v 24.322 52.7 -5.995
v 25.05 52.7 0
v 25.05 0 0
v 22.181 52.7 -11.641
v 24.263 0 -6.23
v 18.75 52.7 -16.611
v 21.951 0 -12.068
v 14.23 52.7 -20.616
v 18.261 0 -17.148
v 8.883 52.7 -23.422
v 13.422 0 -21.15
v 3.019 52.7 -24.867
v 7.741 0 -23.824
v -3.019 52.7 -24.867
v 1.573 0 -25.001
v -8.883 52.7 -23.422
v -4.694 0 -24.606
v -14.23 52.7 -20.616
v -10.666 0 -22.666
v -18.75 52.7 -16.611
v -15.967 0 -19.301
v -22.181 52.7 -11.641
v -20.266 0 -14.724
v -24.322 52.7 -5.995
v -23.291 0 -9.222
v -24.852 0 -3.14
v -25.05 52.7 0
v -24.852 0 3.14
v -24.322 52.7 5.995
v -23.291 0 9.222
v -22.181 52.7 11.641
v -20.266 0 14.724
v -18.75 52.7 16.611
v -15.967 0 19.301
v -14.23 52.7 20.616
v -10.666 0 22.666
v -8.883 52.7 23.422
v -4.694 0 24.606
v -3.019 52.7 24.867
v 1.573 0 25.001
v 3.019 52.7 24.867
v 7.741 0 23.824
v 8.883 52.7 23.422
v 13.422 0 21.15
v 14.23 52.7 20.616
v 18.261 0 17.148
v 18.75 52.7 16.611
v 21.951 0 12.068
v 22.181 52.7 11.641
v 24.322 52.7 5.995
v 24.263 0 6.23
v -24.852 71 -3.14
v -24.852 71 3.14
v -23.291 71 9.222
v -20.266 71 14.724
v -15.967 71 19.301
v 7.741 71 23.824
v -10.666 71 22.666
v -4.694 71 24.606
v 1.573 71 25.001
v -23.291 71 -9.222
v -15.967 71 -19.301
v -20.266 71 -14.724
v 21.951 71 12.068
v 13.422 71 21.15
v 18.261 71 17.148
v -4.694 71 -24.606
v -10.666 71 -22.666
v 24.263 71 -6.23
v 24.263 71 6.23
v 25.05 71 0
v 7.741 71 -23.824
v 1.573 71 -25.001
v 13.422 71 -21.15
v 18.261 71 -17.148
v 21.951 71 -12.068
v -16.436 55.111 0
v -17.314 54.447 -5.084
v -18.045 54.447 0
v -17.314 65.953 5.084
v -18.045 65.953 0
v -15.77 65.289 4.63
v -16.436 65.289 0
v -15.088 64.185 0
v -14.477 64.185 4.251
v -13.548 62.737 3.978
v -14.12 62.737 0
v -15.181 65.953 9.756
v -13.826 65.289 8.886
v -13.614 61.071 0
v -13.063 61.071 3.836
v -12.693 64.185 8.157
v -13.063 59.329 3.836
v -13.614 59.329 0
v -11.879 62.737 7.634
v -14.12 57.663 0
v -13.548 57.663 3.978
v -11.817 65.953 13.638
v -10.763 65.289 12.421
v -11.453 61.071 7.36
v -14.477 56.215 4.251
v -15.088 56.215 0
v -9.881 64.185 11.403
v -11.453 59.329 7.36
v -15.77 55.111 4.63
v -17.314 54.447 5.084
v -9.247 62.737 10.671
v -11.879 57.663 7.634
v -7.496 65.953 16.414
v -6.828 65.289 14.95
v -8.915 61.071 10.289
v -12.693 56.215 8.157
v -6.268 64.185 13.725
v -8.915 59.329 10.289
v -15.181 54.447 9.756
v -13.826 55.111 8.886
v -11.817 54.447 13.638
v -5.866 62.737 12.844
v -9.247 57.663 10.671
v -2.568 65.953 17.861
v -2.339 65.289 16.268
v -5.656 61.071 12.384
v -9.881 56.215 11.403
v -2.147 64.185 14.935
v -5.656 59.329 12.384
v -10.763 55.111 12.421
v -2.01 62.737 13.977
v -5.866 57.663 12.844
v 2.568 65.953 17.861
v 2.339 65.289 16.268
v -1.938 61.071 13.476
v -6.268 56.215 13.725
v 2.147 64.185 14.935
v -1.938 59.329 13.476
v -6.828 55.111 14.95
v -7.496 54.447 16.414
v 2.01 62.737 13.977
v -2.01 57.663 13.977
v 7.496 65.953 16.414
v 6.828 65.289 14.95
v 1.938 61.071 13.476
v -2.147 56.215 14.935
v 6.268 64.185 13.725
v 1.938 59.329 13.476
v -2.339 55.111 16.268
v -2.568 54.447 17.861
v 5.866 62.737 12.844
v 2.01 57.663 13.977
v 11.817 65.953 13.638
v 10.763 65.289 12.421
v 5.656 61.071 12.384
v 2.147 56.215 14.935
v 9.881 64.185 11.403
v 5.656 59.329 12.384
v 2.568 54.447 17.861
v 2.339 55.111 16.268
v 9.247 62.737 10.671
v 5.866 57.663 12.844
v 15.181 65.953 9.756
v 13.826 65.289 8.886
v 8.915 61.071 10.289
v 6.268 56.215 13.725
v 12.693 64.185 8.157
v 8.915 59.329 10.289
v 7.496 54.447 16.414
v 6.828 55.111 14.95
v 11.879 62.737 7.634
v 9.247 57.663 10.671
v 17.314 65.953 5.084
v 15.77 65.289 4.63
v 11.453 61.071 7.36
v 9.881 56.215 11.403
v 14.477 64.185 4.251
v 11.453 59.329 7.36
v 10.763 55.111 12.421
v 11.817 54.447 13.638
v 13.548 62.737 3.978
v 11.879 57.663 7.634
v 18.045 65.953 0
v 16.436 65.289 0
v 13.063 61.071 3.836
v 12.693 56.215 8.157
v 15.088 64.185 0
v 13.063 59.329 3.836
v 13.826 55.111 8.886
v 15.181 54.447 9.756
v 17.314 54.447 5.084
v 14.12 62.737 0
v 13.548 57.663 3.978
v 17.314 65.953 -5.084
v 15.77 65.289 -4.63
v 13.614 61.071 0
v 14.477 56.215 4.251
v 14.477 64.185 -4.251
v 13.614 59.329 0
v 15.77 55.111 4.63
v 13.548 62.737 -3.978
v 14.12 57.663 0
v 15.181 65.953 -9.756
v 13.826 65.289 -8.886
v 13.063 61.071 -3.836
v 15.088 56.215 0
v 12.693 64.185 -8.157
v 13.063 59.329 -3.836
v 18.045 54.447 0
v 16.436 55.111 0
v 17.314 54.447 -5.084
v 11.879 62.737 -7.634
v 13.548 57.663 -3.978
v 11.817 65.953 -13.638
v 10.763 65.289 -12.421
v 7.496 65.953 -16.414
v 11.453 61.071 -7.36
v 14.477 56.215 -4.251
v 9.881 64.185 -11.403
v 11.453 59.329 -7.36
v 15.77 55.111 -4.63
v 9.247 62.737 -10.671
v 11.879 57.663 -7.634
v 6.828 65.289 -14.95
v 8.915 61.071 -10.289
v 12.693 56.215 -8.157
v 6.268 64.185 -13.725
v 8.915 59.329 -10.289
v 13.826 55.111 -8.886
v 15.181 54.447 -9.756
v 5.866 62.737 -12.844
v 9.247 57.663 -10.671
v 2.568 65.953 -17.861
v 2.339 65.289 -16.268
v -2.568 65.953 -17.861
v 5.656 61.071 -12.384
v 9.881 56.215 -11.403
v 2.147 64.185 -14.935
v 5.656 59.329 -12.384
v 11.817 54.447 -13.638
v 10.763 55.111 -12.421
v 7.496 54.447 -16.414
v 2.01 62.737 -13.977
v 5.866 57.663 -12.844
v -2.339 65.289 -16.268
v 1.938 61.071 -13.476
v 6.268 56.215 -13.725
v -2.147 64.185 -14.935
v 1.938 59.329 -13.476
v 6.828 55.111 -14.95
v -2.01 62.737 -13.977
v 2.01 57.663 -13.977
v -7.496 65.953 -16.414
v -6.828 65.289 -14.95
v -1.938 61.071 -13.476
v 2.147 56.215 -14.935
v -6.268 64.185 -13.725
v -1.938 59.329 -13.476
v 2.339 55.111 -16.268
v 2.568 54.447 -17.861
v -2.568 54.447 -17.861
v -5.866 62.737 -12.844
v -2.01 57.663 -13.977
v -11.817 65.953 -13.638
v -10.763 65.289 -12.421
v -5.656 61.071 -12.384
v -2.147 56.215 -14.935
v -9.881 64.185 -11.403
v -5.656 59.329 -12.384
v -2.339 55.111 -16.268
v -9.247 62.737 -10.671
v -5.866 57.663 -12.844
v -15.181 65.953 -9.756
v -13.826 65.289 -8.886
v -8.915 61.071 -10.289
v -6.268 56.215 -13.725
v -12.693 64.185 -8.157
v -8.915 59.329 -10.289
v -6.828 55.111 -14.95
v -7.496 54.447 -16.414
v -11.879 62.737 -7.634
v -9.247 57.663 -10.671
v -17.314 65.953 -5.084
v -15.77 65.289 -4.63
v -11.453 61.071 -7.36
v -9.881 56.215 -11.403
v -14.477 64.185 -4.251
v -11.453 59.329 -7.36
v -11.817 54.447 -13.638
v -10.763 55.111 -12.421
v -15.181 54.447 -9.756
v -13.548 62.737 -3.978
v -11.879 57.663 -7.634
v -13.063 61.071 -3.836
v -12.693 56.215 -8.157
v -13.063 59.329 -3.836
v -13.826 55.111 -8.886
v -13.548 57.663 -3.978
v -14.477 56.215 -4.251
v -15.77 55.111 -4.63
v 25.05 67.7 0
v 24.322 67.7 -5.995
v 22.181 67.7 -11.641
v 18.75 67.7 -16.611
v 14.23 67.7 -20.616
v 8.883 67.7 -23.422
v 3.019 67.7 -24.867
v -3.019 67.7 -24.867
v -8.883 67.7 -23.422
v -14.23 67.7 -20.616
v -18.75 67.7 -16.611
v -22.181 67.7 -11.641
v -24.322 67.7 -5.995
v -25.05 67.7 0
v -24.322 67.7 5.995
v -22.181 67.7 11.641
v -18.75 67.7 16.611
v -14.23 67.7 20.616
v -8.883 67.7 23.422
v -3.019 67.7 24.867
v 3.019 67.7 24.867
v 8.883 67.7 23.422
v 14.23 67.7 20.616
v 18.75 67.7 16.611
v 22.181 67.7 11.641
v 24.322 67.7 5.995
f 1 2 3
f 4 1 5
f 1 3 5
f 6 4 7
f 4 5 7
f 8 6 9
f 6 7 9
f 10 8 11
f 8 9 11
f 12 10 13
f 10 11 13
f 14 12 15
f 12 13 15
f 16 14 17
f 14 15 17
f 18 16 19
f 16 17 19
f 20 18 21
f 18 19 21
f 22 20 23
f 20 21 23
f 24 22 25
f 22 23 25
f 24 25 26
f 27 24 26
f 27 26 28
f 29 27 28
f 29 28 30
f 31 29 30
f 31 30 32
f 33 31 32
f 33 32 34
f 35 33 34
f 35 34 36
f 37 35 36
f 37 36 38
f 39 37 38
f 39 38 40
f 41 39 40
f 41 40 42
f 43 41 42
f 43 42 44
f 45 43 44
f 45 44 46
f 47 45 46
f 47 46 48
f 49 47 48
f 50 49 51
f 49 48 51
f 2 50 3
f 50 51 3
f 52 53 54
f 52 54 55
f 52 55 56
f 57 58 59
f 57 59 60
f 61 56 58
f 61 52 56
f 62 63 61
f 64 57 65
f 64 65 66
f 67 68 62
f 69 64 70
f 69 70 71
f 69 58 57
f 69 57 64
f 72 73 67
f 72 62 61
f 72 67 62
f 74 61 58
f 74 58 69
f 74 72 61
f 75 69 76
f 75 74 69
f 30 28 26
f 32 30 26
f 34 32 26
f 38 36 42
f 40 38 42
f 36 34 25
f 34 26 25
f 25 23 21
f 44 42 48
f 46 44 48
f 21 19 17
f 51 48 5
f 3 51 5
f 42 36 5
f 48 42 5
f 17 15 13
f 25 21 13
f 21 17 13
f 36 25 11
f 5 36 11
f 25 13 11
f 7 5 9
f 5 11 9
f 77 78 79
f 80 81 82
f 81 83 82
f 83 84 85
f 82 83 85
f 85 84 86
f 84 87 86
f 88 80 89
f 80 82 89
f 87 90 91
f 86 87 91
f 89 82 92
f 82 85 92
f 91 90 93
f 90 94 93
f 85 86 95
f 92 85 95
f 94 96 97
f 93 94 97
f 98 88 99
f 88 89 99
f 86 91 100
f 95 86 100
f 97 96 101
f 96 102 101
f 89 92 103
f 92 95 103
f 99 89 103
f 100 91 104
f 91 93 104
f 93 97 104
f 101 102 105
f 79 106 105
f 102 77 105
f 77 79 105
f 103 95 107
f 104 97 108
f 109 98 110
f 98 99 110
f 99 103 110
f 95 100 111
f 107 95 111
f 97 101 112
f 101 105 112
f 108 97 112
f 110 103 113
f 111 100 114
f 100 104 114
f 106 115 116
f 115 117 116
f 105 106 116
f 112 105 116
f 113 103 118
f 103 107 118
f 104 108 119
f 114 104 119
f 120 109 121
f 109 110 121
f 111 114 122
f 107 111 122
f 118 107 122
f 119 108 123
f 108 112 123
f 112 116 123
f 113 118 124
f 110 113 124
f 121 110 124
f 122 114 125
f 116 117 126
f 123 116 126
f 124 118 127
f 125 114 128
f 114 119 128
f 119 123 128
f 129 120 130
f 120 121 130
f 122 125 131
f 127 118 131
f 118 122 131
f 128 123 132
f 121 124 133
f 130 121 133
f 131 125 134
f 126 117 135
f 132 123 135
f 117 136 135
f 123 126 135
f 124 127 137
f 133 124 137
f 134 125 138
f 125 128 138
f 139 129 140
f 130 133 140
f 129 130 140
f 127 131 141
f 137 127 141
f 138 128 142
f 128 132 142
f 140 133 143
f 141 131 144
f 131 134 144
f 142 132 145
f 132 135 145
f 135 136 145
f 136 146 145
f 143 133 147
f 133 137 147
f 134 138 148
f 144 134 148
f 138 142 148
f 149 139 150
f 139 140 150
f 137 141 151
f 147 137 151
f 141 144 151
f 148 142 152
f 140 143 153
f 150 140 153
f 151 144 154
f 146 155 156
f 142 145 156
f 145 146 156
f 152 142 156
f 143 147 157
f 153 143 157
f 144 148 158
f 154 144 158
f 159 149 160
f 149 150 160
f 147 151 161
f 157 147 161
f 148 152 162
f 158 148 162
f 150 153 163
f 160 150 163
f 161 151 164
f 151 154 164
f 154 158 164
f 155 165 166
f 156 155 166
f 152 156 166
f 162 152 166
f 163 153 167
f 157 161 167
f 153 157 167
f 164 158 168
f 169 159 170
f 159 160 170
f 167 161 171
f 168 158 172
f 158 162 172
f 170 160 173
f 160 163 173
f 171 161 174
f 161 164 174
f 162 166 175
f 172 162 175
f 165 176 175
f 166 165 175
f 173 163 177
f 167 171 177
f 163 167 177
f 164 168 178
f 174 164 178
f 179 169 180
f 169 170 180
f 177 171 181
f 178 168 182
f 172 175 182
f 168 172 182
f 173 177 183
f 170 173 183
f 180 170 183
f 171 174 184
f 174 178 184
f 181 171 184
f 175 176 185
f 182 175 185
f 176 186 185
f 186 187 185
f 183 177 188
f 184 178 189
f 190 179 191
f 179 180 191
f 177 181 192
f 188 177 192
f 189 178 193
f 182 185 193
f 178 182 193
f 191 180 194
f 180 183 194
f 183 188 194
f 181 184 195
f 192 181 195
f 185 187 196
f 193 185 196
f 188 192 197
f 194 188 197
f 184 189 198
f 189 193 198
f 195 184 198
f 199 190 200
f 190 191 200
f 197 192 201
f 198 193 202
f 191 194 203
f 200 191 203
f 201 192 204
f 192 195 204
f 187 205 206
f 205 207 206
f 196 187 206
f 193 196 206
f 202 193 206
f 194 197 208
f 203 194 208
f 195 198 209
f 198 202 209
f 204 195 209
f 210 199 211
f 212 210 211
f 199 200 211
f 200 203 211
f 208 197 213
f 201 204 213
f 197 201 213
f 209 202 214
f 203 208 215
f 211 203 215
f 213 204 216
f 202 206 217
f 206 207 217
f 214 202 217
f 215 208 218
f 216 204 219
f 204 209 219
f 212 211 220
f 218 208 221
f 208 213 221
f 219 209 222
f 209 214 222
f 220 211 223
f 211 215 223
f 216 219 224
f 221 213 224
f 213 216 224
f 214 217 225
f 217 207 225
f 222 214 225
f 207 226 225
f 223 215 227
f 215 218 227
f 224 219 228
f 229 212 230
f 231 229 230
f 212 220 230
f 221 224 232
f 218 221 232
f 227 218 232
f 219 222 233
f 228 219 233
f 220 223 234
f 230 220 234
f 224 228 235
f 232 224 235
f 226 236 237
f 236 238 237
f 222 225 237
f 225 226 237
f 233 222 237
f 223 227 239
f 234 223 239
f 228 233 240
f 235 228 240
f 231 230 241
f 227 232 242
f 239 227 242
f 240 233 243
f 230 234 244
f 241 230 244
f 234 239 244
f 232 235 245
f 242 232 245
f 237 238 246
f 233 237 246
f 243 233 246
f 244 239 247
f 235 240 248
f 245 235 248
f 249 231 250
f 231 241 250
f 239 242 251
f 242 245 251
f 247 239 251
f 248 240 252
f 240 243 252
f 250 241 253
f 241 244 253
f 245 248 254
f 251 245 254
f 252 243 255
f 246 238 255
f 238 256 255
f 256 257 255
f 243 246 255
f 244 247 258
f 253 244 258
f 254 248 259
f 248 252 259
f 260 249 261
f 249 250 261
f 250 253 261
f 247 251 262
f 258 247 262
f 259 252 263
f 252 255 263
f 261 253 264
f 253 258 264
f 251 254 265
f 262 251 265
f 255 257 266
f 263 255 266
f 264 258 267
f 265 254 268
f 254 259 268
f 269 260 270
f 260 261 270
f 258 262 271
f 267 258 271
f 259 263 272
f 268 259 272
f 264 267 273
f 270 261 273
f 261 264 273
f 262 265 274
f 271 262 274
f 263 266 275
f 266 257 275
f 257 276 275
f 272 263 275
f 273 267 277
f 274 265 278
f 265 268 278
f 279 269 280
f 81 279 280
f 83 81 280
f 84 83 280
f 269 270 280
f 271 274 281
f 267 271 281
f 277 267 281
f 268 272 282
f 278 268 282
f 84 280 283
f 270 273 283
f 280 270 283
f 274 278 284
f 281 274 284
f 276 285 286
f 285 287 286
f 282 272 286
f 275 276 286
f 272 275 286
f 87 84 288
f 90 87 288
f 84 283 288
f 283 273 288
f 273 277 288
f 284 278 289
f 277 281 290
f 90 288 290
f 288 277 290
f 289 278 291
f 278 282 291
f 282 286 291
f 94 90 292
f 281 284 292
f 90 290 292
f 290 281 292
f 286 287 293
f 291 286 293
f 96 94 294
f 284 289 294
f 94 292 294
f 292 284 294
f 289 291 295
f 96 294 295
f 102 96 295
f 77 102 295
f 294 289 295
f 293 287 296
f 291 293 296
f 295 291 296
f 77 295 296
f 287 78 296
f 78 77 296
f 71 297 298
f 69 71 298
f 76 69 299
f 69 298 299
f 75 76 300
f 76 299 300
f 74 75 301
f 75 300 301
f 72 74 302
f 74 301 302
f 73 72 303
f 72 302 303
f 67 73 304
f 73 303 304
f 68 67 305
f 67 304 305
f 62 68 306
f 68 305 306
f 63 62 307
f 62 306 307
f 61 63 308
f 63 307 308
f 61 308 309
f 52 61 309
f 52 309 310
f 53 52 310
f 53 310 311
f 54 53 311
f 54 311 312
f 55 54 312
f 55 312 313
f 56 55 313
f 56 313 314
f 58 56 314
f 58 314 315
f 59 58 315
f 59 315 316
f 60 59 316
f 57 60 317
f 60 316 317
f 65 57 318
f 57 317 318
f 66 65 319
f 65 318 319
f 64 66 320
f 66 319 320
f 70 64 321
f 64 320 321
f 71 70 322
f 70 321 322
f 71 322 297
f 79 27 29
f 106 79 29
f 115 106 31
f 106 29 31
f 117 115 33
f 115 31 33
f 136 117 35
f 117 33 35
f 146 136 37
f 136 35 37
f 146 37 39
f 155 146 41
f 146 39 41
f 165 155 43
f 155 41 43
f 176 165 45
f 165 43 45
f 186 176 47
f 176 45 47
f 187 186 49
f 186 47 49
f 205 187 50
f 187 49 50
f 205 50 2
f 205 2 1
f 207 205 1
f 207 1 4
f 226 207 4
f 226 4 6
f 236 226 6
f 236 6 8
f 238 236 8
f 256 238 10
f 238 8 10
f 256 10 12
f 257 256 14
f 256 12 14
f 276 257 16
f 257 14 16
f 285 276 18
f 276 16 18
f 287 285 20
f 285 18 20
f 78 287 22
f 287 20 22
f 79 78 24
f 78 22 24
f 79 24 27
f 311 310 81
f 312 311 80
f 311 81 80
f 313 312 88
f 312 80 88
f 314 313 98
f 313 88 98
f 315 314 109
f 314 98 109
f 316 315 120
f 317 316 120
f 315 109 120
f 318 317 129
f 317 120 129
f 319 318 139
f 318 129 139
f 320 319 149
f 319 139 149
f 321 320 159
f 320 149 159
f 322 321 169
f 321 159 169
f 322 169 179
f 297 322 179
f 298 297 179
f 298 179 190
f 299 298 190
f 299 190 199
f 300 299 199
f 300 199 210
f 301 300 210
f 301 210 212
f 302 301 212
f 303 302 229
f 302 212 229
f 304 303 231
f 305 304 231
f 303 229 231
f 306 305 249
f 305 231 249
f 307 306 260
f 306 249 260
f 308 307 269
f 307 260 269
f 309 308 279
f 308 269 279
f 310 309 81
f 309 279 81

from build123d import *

# Parameters (mm, degrees)
SKETCH1_R           = 25.05
BOSS_EXTRUDE1_DEPTH = 71


with BuildPart() as part:
    # Sketch1 → Boss-Extrude1 (new body)
    with BuildSketch(Plane(origin=(0, 0, 0), x_dir=(1, 0, 0), z_dir=(0, 1, 0))):
        Circle(SKETCH1_R)
    extrude(amount=BOSS_EXTRUDE1_DEPTH)

    # Sketch2 → Cut-Revolve1 (revolve, cut)
    with BuildSketch(Plane.XY):
        with BuildLine():
            Line((-25.05, 67.7), (-18.045116148, 65.953486299))
            ThreePointArc((-18.045116148, 65.953486299), (-13.55, 60.2), (-18.045116148, 54.446513701))
            Line((-18.045116148, 54.446513701), (-25.05, 52.7))
            Line((-25.05, 52.7), (-25.05, 67.7))
        make_face()
    revolve(axis=Axis((0, -3.55, 0), (0, 1, 0)), mode=Mode.SUBTRACT)


solid = part.part
